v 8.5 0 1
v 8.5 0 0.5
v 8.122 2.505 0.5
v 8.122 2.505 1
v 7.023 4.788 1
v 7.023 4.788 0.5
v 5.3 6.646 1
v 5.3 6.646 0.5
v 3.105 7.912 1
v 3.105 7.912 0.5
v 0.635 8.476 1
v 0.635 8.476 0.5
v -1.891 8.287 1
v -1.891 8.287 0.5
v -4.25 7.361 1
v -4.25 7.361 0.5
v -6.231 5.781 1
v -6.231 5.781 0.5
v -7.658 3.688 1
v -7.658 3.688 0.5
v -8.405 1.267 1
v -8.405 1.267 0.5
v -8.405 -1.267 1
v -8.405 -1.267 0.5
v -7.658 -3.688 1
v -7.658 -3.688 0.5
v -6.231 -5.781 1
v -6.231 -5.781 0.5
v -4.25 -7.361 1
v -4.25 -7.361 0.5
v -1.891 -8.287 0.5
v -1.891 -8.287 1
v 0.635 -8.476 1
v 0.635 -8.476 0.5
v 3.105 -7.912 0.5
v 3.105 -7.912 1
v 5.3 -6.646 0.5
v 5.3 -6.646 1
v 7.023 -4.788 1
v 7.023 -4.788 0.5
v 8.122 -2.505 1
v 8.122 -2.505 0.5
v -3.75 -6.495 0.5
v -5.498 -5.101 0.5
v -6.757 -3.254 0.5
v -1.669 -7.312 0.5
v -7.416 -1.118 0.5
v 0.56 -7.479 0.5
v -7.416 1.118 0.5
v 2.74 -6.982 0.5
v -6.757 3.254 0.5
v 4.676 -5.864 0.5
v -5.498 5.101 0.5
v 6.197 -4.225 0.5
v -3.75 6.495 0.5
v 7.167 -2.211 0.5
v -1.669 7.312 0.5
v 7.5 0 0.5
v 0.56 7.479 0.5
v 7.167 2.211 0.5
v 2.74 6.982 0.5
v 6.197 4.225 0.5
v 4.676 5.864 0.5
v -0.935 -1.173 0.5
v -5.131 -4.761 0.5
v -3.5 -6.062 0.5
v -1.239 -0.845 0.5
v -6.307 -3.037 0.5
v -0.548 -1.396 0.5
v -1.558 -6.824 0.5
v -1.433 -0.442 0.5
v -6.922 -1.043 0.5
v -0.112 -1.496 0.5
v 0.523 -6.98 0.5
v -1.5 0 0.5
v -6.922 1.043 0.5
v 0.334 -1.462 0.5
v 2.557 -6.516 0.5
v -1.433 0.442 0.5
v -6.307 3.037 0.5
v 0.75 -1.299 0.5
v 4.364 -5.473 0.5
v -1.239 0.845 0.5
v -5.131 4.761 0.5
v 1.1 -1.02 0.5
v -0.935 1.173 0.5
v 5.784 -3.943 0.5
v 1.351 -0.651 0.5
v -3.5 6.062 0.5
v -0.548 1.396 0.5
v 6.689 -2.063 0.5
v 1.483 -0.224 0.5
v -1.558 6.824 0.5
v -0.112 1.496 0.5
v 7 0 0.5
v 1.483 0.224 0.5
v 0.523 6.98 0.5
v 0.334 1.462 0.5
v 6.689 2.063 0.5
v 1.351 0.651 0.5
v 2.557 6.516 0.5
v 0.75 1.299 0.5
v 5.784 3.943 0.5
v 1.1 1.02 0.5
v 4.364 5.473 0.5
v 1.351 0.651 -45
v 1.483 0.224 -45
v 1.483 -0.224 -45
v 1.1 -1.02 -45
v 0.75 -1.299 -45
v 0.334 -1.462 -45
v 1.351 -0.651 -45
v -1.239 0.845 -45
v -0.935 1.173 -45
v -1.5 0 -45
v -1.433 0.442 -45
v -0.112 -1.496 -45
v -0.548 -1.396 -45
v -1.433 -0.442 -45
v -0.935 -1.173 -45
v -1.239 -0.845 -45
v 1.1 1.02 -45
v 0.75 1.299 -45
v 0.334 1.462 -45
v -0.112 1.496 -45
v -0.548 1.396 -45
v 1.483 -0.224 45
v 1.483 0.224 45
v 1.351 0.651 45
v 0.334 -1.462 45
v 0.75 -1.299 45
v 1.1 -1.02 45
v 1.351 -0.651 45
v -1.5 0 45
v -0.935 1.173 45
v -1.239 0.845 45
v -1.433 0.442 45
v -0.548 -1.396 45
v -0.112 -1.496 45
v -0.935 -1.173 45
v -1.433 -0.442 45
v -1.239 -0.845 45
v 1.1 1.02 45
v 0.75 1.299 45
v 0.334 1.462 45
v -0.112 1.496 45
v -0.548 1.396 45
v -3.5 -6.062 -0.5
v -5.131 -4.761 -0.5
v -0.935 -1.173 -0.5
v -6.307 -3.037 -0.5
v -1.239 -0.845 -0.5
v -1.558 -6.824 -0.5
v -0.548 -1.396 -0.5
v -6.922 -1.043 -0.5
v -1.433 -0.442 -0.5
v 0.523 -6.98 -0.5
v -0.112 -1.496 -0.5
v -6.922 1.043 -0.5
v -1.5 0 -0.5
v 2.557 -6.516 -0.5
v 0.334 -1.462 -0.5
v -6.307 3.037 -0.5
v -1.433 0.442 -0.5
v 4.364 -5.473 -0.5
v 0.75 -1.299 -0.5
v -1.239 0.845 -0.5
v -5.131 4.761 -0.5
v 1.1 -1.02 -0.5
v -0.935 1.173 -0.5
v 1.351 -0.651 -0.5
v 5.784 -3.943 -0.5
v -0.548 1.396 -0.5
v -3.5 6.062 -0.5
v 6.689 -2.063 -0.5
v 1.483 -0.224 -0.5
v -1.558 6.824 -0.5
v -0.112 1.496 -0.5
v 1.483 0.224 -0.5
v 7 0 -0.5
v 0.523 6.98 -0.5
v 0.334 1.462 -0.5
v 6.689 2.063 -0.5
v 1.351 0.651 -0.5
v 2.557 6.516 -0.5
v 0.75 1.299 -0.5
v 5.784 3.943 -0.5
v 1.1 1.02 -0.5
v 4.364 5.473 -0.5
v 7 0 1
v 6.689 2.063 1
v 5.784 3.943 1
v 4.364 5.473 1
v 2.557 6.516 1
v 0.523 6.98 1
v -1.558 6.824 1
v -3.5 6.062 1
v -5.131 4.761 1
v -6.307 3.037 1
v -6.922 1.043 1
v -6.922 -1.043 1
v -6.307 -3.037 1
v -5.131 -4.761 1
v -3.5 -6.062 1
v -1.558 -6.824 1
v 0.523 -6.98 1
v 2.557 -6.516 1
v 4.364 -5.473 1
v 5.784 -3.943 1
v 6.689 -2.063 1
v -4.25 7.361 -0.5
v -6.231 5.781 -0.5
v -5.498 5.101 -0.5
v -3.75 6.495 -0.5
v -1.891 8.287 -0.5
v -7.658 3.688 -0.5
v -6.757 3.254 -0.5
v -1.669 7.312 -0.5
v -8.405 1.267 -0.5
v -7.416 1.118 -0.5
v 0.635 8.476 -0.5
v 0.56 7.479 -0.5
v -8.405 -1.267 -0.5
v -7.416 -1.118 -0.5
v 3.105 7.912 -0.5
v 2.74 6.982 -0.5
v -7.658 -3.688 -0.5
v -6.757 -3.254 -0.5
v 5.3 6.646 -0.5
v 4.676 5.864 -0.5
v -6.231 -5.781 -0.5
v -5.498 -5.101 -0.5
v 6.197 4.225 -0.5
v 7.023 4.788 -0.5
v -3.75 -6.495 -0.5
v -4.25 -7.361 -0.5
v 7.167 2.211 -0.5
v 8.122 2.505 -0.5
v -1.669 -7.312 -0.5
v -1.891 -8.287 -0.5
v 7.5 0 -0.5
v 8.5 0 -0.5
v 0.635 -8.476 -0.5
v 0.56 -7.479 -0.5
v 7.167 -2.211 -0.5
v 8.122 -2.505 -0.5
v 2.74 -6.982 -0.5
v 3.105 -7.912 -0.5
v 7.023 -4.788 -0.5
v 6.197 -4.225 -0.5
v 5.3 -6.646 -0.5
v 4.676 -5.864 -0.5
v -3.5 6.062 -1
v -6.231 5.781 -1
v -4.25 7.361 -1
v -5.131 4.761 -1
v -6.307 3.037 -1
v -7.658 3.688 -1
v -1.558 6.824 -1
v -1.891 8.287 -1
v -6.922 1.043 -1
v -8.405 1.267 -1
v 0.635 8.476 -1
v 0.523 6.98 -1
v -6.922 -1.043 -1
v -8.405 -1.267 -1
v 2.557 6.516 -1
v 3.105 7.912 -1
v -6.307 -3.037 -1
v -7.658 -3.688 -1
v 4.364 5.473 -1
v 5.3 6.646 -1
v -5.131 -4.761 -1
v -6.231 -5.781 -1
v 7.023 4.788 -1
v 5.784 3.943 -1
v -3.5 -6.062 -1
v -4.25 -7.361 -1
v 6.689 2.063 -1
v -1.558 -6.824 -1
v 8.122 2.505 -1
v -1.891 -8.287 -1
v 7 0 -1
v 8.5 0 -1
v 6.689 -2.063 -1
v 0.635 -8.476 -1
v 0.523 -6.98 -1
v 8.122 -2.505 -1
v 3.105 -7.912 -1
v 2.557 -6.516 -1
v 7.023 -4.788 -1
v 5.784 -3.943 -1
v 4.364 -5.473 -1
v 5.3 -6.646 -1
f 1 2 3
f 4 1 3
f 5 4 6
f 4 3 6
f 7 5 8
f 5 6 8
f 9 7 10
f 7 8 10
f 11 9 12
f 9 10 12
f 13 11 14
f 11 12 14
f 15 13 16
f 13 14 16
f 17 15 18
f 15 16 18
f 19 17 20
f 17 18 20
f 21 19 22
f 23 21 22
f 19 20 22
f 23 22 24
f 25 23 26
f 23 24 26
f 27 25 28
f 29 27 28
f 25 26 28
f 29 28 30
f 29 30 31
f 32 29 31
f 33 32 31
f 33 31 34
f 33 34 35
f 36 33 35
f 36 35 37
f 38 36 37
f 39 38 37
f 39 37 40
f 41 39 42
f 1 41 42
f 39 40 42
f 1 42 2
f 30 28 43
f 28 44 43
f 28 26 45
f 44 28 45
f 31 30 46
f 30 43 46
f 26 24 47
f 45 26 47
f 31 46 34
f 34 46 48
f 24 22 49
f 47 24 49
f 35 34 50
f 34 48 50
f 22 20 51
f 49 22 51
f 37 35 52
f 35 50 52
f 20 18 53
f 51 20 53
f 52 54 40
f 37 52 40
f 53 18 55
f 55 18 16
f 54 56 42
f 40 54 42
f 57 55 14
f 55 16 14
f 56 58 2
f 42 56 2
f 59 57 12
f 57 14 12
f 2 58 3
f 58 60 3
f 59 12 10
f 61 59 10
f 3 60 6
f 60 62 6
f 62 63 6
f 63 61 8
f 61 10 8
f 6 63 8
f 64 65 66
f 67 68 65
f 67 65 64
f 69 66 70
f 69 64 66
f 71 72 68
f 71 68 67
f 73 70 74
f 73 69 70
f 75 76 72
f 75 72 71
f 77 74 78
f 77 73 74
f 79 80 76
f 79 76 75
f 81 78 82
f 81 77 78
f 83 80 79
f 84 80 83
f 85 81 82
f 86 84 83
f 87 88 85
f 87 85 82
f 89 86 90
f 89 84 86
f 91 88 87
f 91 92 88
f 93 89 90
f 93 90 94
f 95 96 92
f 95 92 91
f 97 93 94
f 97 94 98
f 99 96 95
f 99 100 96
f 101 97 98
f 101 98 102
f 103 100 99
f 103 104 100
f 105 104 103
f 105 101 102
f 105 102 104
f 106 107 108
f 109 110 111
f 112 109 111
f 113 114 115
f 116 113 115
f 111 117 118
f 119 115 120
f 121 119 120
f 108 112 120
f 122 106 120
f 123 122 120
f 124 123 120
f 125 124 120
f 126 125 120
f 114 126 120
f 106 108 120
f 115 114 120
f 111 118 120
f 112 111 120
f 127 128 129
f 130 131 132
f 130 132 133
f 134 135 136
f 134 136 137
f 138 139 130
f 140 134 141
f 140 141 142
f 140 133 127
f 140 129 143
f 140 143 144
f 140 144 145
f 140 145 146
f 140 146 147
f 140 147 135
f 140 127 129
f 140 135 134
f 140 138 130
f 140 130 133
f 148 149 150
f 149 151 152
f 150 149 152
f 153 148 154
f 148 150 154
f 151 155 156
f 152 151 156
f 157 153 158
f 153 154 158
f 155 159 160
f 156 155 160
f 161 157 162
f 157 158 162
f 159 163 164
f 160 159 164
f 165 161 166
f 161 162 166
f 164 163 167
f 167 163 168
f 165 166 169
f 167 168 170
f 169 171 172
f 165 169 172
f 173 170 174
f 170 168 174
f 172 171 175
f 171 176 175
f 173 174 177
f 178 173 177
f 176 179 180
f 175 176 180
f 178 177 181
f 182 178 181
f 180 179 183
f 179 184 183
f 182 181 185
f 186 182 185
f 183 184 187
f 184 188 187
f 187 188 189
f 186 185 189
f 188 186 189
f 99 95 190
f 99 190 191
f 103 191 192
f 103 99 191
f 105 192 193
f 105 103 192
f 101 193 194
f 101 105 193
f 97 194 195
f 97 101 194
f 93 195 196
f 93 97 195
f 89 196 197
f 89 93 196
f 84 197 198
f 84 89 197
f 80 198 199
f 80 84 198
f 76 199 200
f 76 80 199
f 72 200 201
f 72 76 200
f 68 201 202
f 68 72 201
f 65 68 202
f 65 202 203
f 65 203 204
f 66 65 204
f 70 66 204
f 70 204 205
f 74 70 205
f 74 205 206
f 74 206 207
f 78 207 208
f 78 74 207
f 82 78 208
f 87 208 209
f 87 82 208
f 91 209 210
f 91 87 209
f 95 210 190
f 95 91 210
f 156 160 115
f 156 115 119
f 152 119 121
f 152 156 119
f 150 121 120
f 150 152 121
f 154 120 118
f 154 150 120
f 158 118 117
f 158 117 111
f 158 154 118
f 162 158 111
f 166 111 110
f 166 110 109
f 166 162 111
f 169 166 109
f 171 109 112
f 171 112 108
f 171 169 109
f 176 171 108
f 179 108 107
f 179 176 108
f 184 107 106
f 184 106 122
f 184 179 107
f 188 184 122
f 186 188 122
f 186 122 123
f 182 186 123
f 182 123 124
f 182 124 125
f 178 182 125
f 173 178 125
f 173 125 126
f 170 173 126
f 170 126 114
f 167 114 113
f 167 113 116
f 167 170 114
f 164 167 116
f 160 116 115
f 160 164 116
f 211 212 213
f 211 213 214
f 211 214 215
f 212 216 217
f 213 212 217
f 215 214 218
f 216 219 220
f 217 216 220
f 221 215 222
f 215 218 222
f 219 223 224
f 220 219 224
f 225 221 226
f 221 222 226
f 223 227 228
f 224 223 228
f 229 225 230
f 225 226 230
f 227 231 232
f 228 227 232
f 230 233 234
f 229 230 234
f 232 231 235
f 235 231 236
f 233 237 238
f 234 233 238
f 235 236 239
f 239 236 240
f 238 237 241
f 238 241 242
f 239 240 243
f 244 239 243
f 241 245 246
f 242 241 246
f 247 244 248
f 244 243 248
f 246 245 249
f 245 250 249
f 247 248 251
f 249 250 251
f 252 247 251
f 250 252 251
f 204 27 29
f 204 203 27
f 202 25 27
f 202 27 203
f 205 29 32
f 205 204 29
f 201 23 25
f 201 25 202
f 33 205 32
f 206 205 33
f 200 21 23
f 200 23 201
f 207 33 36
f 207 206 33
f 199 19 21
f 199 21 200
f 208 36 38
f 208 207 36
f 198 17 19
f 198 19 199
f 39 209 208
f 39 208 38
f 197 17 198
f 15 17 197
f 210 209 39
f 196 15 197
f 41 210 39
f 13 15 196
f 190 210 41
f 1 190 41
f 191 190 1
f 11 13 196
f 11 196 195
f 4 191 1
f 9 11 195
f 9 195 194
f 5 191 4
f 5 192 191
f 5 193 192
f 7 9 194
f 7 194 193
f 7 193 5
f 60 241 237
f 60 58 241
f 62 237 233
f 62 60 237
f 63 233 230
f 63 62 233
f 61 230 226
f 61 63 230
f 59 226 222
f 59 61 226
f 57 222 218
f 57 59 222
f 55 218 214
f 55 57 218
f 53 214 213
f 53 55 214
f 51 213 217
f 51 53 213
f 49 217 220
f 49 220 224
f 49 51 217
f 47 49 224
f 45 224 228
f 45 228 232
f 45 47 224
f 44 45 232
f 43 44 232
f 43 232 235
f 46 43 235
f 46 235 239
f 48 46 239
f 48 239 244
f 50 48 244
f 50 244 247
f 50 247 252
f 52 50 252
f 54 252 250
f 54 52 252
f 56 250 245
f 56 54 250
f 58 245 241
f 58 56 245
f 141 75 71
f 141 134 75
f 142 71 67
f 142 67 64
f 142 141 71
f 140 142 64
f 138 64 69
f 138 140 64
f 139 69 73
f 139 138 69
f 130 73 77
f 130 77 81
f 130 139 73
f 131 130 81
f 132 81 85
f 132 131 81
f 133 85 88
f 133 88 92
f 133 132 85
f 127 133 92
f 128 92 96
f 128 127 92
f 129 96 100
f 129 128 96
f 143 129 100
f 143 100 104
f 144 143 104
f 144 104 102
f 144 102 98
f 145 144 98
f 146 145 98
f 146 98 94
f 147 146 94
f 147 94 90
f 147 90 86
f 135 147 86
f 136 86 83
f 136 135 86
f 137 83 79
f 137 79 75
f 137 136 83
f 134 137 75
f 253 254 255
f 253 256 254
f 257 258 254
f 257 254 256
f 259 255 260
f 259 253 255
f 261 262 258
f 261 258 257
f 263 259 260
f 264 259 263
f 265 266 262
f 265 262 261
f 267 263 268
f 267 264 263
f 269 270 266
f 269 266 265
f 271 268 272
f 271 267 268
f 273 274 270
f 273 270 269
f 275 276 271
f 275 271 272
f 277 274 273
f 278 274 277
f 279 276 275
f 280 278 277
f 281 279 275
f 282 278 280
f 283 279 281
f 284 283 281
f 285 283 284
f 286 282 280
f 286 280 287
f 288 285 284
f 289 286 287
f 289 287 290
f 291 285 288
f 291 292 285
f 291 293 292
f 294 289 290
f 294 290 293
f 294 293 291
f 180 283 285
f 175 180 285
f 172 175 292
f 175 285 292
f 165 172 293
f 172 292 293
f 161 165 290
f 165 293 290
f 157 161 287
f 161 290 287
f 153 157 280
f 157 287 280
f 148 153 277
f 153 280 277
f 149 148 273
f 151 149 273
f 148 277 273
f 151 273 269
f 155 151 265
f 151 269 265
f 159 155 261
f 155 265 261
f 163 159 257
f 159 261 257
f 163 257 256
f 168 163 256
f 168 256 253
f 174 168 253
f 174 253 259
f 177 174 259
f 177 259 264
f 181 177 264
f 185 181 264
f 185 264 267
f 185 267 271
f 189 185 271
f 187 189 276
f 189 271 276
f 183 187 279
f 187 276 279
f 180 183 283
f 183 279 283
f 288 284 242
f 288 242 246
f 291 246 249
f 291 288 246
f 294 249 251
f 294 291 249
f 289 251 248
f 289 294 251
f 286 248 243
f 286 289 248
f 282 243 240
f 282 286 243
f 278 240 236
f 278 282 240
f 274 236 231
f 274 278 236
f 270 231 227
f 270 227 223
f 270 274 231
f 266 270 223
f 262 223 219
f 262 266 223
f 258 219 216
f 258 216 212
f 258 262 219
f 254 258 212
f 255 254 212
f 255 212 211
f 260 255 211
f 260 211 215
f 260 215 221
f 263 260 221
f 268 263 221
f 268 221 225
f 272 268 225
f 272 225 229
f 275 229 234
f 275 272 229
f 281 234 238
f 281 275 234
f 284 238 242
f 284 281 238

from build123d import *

# Parameters (mm, degrees)
SKETCH1_R           = 7.5
BOSS_EXTRUDE1_DEPTH = 0.5
SKETCH3_R           = 8.5
SKETCH3_R_2         = 7
BOSS_EXTRUDE2_DEPTH = 0.5
BOSS_EXTRUDE3_START = 0.5
SKETCH4_R           = 8.5
SKETCH4_R_2         = 7
BOSS_EXTRUDE3_DEPTH = 0.5
SKETCH6_R           = 1.5
BOSS_EXTRUDE4_DEPTH = 45


with BuildPart() as part:
    # Sketch1 → Boss-Extrude1 (new, symmetric)
    with BuildSketch(Plane.XY):
        Circle(SKETCH1_R)
    extrude(amount=BOSS_EXTRUDE1_DEPTH, both=True)

    # Sketch3 → Boss-Extrude2 (add)
    with BuildSketch(Plane.XY.offset(0.5)):
        Circle(SKETCH3_R)
        Circle(SKETCH3_R_2, mode=Mode.SUBTRACT)
    extrude(amount=BOSS_EXTRUDE2_DEPTH)

    # Sketch4 → Boss-Extrude3 (add)
    with BuildSketch(Plane(origin=(0, 0, -0.5), x_dir=(-1, 0, 0), z_dir=(0, 0, -1)).offset(BOSS_EXTRUDE3_START)):
        with Locations(Location((0, 0, 0), (0, 0, 180))):
            Circle(SKETCH4_R)
        with Locations(Location((0, 0, 0), (0, 0, 180))):
            Circle(SKETCH4_R_2, mode=Mode.SUBTRACT)
    extrude(amount=-BOSS_EXTRUDE3_DEPTH)

    # Sketch6 → Boss-Extrude4 (add, symmetric)
    with BuildSketch(Plane.XY):
        with Locations(Location((0, 0, 0), (0, 0, 180))):
            Circle(SKETCH6_R)
    extrude(amount=BOSS_EXTRUDE4_DEPTH, both=True)


solid = part.part
